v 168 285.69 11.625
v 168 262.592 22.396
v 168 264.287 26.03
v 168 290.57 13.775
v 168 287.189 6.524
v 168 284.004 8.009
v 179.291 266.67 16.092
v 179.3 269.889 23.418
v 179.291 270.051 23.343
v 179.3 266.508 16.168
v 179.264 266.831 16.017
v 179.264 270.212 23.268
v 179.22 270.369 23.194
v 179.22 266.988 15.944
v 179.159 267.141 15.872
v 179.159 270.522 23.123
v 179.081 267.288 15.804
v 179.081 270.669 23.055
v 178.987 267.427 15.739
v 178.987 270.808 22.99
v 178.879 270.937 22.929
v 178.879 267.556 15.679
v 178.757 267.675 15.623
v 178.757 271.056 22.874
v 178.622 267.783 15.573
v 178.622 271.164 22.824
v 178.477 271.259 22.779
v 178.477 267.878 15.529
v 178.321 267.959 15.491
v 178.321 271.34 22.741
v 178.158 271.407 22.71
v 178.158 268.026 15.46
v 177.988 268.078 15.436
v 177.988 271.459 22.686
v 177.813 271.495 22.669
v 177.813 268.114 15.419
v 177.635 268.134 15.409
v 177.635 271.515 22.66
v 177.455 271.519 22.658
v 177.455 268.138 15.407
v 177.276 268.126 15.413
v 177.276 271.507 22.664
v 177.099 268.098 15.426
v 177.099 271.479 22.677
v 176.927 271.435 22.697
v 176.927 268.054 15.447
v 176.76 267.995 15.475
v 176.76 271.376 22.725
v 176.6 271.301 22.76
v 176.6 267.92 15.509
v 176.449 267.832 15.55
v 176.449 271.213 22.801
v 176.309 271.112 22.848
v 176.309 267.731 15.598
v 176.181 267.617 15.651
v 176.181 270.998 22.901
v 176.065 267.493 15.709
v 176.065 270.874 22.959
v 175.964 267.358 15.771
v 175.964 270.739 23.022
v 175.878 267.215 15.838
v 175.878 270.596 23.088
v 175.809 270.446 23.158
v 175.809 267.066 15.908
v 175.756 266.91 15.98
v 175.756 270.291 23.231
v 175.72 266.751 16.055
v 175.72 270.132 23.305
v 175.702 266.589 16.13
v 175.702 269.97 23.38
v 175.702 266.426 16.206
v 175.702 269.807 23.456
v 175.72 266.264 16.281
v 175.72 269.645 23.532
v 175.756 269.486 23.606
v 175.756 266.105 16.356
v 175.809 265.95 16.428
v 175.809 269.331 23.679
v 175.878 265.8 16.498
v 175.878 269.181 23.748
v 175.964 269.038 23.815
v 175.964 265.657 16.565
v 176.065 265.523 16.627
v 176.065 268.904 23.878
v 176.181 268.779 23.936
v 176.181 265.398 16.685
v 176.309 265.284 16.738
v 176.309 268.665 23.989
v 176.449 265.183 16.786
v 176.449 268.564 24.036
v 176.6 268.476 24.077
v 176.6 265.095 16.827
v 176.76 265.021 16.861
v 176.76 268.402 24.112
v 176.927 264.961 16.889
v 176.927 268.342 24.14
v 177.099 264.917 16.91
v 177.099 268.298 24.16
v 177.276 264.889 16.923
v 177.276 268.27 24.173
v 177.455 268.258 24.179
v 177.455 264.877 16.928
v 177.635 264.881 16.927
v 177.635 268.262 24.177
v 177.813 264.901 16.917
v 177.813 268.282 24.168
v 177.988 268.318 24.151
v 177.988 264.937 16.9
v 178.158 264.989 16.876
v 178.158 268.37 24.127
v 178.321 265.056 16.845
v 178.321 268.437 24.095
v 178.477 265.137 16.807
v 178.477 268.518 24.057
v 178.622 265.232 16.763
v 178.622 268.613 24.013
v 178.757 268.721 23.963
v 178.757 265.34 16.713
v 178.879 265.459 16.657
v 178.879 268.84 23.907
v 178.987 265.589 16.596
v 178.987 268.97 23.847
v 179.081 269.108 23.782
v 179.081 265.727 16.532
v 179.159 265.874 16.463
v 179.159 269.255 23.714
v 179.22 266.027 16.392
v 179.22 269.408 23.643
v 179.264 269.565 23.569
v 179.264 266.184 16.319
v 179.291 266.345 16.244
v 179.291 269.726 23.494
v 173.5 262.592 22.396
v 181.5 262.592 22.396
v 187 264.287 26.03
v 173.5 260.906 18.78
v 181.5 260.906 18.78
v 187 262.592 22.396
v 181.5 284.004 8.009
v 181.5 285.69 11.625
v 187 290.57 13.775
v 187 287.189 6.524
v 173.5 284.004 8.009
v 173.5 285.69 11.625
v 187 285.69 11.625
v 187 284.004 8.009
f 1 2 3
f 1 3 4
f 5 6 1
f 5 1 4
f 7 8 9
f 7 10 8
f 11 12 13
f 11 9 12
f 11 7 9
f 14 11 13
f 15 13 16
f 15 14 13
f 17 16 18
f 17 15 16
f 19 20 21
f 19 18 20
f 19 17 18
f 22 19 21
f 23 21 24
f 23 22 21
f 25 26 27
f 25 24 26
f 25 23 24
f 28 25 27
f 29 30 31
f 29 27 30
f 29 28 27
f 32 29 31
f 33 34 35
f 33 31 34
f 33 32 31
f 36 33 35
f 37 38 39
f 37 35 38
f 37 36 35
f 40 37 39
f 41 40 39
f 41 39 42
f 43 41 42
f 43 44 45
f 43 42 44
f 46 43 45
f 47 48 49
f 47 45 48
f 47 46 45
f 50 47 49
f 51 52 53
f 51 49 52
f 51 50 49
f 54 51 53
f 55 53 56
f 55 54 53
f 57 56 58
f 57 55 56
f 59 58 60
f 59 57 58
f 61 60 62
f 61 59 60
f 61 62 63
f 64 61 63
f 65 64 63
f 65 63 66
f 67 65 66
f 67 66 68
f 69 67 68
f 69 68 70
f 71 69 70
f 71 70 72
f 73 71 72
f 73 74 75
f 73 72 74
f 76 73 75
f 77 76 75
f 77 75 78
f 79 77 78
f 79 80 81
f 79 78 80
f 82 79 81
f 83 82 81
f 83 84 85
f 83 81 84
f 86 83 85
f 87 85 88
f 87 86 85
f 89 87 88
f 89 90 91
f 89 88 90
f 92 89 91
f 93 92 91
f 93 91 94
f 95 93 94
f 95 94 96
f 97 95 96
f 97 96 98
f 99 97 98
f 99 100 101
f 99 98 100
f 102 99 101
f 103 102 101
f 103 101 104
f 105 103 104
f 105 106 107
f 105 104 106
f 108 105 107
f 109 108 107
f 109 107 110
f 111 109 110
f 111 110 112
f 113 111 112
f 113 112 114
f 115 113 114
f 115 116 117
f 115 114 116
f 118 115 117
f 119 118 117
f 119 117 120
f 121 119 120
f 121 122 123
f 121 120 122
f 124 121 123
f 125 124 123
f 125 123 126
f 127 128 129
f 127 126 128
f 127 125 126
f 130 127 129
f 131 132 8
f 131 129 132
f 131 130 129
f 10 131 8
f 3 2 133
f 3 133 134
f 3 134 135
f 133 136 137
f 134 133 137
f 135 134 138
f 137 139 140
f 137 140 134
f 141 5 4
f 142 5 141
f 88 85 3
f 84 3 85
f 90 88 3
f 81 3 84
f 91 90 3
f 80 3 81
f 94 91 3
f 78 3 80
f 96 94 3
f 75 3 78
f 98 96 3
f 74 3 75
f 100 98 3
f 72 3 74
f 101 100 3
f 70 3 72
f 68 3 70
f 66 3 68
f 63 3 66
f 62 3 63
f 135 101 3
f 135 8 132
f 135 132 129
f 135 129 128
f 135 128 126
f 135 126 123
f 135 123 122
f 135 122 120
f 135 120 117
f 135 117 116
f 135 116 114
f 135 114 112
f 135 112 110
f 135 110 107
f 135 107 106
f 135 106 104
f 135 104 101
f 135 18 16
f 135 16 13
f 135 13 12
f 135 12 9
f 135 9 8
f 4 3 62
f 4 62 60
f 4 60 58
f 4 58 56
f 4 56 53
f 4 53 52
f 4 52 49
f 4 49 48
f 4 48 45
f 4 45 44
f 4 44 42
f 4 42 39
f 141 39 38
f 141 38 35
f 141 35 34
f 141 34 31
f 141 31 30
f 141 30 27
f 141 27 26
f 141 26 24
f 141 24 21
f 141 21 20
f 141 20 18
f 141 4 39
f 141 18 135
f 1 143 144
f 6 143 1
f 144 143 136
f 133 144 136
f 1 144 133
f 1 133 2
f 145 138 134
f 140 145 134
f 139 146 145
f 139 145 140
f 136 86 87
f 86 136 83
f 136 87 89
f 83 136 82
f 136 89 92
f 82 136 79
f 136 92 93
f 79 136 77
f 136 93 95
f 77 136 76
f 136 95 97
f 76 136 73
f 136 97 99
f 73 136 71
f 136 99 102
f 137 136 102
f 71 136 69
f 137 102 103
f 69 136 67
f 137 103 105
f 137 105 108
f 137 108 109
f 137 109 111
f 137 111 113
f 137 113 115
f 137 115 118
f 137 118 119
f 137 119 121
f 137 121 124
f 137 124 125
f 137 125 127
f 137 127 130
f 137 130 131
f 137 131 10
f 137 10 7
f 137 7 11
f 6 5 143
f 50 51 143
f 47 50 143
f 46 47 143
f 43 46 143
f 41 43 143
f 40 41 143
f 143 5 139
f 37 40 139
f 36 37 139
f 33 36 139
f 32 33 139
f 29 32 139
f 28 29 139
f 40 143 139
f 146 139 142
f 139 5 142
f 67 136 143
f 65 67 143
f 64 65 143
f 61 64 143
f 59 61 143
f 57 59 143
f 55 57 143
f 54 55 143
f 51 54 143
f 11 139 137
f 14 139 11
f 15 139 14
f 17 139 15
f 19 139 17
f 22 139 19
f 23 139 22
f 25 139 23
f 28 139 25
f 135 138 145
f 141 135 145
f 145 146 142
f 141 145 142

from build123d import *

# Parameters (mm, degrees)
CYLINDER012_R               = 1.8
CYLINDER012_DEPTH           = 15
CYLINDER012_PLACEMENT_ANGLE = 25
BOX027_W                    = 140
BOX027_H                    = 162
BOX027_DEPTH                = 4
BOX027_ROLL_ANGLE           = 25.000043
BOX027_PLACEMENT_ANGLE      = 180
BOX026_W                    = 140
BOX026_H                    = 162
BOX026_DEPTH                = 4
BOX026_ROLL_ANGLE           = 25.000043
BOX026_PLACEMENT_ANGLE      = 180
BOX025_W                    = 19
BOX025_H                    = 29
BOX025_DEPTH                = 8
BOX025_PLACEMENT_ANGLE      = 25


with BuildPart() as m2bolt:
    # Cylinder012 → Cylinder012 (new body)
    with BuildSketch(Plane.XY):
        Circle(CYLINDER012_R)
    extrude(amount=CYLINDER012_DEPTH)


with BuildPart() as m2bolt_1:
    # Cylinder012 placement: moved
    add(m2bolt.part.moved(Location((177.5, 263.58, 9.88971))).rotate(Axis((177.5, 263.58, 9.88971), (-1, 0, 0)), CYLINDER012_PLACEMENT_ANGLE))


with BuildPart() as solar_panel008:
    # Box027 → Box027 (new body)
    with BuildSketch(Plane.XY):
        with Locations((70, 81)):
            Rectangle(BOX027_W, BOX027_H)
    extrude(amount=BOX027_DEPTH)


with BuildPart() as solar_panel008_1:
    # Box027 roll: moved
    add(solar_panel008.part.rotate(Axis((0, 0, 0), (1, 0, 0)), BOX027_ROLL_ANGLE))


with BuildPart() as solar_panel008_2:
    # Box027 placement: moved
    add(solar_panel008_1.part.moved(Location((173.5, 284, 8))).rotate(Axis((173.5, 284, 8), (0, 0, 1)), BOX027_PLACEMENT_ANGLE))


with BuildPart() as solarpanels001:
    # Box026 → Box026 (new body)
    with BuildSketch(Plane.XY):
        with Locations((70, 81)):
            Rectangle(BOX026_W, BOX026_H)
    extrude(amount=BOX026_DEPTH)


with BuildPart() as solarpanels001_1:
    # Box026 roll: moved
    add(solarpanels001.part.rotate(Axis((0, 0, 0), (1, 0, 0)), BOX026_ROLL_ANGLE))


with BuildPart() as solarpanels001_2:
    # Box026 placement: moved
    add(solarpanels001_1.part.moved(Location((321.5, 284, 8))).rotate(Axis((321.5, 284, 8), (0, 0, 1)), BOX026_PLACEMENT_ANGLE))

    # Fusion005: union solar Panel008
    add(solar_panel008_2.part)


with BuildPart() as topmid:
    # Box025 → Box025 (new body)
    with BuildSketch(Plane.XY):
        with Locations((9.5, 14.5)):
            Rectangle(BOX025_W, BOX025_H)
    extrude(amount=BOX025_DEPTH)


with BuildPart() as topmid_1:
    # Box025 placement: moved
    add(topmid.part.moved(Location((168, 260.906, 18.78))).rotate(Axis((168, 260.906, 18.78), (-1, 0, 0)), BOX025_PLACEMENT_ANGLE))

    # Cut013: cut solarPanels001
    add(solarpanels001_2.part, mode=Mode.SUBTRACT)

    # Cut014: cut m2Bolt
    add(m2bolt_1.part, mode=Mode.SUBTRACT)


solid = topmid_1.part
